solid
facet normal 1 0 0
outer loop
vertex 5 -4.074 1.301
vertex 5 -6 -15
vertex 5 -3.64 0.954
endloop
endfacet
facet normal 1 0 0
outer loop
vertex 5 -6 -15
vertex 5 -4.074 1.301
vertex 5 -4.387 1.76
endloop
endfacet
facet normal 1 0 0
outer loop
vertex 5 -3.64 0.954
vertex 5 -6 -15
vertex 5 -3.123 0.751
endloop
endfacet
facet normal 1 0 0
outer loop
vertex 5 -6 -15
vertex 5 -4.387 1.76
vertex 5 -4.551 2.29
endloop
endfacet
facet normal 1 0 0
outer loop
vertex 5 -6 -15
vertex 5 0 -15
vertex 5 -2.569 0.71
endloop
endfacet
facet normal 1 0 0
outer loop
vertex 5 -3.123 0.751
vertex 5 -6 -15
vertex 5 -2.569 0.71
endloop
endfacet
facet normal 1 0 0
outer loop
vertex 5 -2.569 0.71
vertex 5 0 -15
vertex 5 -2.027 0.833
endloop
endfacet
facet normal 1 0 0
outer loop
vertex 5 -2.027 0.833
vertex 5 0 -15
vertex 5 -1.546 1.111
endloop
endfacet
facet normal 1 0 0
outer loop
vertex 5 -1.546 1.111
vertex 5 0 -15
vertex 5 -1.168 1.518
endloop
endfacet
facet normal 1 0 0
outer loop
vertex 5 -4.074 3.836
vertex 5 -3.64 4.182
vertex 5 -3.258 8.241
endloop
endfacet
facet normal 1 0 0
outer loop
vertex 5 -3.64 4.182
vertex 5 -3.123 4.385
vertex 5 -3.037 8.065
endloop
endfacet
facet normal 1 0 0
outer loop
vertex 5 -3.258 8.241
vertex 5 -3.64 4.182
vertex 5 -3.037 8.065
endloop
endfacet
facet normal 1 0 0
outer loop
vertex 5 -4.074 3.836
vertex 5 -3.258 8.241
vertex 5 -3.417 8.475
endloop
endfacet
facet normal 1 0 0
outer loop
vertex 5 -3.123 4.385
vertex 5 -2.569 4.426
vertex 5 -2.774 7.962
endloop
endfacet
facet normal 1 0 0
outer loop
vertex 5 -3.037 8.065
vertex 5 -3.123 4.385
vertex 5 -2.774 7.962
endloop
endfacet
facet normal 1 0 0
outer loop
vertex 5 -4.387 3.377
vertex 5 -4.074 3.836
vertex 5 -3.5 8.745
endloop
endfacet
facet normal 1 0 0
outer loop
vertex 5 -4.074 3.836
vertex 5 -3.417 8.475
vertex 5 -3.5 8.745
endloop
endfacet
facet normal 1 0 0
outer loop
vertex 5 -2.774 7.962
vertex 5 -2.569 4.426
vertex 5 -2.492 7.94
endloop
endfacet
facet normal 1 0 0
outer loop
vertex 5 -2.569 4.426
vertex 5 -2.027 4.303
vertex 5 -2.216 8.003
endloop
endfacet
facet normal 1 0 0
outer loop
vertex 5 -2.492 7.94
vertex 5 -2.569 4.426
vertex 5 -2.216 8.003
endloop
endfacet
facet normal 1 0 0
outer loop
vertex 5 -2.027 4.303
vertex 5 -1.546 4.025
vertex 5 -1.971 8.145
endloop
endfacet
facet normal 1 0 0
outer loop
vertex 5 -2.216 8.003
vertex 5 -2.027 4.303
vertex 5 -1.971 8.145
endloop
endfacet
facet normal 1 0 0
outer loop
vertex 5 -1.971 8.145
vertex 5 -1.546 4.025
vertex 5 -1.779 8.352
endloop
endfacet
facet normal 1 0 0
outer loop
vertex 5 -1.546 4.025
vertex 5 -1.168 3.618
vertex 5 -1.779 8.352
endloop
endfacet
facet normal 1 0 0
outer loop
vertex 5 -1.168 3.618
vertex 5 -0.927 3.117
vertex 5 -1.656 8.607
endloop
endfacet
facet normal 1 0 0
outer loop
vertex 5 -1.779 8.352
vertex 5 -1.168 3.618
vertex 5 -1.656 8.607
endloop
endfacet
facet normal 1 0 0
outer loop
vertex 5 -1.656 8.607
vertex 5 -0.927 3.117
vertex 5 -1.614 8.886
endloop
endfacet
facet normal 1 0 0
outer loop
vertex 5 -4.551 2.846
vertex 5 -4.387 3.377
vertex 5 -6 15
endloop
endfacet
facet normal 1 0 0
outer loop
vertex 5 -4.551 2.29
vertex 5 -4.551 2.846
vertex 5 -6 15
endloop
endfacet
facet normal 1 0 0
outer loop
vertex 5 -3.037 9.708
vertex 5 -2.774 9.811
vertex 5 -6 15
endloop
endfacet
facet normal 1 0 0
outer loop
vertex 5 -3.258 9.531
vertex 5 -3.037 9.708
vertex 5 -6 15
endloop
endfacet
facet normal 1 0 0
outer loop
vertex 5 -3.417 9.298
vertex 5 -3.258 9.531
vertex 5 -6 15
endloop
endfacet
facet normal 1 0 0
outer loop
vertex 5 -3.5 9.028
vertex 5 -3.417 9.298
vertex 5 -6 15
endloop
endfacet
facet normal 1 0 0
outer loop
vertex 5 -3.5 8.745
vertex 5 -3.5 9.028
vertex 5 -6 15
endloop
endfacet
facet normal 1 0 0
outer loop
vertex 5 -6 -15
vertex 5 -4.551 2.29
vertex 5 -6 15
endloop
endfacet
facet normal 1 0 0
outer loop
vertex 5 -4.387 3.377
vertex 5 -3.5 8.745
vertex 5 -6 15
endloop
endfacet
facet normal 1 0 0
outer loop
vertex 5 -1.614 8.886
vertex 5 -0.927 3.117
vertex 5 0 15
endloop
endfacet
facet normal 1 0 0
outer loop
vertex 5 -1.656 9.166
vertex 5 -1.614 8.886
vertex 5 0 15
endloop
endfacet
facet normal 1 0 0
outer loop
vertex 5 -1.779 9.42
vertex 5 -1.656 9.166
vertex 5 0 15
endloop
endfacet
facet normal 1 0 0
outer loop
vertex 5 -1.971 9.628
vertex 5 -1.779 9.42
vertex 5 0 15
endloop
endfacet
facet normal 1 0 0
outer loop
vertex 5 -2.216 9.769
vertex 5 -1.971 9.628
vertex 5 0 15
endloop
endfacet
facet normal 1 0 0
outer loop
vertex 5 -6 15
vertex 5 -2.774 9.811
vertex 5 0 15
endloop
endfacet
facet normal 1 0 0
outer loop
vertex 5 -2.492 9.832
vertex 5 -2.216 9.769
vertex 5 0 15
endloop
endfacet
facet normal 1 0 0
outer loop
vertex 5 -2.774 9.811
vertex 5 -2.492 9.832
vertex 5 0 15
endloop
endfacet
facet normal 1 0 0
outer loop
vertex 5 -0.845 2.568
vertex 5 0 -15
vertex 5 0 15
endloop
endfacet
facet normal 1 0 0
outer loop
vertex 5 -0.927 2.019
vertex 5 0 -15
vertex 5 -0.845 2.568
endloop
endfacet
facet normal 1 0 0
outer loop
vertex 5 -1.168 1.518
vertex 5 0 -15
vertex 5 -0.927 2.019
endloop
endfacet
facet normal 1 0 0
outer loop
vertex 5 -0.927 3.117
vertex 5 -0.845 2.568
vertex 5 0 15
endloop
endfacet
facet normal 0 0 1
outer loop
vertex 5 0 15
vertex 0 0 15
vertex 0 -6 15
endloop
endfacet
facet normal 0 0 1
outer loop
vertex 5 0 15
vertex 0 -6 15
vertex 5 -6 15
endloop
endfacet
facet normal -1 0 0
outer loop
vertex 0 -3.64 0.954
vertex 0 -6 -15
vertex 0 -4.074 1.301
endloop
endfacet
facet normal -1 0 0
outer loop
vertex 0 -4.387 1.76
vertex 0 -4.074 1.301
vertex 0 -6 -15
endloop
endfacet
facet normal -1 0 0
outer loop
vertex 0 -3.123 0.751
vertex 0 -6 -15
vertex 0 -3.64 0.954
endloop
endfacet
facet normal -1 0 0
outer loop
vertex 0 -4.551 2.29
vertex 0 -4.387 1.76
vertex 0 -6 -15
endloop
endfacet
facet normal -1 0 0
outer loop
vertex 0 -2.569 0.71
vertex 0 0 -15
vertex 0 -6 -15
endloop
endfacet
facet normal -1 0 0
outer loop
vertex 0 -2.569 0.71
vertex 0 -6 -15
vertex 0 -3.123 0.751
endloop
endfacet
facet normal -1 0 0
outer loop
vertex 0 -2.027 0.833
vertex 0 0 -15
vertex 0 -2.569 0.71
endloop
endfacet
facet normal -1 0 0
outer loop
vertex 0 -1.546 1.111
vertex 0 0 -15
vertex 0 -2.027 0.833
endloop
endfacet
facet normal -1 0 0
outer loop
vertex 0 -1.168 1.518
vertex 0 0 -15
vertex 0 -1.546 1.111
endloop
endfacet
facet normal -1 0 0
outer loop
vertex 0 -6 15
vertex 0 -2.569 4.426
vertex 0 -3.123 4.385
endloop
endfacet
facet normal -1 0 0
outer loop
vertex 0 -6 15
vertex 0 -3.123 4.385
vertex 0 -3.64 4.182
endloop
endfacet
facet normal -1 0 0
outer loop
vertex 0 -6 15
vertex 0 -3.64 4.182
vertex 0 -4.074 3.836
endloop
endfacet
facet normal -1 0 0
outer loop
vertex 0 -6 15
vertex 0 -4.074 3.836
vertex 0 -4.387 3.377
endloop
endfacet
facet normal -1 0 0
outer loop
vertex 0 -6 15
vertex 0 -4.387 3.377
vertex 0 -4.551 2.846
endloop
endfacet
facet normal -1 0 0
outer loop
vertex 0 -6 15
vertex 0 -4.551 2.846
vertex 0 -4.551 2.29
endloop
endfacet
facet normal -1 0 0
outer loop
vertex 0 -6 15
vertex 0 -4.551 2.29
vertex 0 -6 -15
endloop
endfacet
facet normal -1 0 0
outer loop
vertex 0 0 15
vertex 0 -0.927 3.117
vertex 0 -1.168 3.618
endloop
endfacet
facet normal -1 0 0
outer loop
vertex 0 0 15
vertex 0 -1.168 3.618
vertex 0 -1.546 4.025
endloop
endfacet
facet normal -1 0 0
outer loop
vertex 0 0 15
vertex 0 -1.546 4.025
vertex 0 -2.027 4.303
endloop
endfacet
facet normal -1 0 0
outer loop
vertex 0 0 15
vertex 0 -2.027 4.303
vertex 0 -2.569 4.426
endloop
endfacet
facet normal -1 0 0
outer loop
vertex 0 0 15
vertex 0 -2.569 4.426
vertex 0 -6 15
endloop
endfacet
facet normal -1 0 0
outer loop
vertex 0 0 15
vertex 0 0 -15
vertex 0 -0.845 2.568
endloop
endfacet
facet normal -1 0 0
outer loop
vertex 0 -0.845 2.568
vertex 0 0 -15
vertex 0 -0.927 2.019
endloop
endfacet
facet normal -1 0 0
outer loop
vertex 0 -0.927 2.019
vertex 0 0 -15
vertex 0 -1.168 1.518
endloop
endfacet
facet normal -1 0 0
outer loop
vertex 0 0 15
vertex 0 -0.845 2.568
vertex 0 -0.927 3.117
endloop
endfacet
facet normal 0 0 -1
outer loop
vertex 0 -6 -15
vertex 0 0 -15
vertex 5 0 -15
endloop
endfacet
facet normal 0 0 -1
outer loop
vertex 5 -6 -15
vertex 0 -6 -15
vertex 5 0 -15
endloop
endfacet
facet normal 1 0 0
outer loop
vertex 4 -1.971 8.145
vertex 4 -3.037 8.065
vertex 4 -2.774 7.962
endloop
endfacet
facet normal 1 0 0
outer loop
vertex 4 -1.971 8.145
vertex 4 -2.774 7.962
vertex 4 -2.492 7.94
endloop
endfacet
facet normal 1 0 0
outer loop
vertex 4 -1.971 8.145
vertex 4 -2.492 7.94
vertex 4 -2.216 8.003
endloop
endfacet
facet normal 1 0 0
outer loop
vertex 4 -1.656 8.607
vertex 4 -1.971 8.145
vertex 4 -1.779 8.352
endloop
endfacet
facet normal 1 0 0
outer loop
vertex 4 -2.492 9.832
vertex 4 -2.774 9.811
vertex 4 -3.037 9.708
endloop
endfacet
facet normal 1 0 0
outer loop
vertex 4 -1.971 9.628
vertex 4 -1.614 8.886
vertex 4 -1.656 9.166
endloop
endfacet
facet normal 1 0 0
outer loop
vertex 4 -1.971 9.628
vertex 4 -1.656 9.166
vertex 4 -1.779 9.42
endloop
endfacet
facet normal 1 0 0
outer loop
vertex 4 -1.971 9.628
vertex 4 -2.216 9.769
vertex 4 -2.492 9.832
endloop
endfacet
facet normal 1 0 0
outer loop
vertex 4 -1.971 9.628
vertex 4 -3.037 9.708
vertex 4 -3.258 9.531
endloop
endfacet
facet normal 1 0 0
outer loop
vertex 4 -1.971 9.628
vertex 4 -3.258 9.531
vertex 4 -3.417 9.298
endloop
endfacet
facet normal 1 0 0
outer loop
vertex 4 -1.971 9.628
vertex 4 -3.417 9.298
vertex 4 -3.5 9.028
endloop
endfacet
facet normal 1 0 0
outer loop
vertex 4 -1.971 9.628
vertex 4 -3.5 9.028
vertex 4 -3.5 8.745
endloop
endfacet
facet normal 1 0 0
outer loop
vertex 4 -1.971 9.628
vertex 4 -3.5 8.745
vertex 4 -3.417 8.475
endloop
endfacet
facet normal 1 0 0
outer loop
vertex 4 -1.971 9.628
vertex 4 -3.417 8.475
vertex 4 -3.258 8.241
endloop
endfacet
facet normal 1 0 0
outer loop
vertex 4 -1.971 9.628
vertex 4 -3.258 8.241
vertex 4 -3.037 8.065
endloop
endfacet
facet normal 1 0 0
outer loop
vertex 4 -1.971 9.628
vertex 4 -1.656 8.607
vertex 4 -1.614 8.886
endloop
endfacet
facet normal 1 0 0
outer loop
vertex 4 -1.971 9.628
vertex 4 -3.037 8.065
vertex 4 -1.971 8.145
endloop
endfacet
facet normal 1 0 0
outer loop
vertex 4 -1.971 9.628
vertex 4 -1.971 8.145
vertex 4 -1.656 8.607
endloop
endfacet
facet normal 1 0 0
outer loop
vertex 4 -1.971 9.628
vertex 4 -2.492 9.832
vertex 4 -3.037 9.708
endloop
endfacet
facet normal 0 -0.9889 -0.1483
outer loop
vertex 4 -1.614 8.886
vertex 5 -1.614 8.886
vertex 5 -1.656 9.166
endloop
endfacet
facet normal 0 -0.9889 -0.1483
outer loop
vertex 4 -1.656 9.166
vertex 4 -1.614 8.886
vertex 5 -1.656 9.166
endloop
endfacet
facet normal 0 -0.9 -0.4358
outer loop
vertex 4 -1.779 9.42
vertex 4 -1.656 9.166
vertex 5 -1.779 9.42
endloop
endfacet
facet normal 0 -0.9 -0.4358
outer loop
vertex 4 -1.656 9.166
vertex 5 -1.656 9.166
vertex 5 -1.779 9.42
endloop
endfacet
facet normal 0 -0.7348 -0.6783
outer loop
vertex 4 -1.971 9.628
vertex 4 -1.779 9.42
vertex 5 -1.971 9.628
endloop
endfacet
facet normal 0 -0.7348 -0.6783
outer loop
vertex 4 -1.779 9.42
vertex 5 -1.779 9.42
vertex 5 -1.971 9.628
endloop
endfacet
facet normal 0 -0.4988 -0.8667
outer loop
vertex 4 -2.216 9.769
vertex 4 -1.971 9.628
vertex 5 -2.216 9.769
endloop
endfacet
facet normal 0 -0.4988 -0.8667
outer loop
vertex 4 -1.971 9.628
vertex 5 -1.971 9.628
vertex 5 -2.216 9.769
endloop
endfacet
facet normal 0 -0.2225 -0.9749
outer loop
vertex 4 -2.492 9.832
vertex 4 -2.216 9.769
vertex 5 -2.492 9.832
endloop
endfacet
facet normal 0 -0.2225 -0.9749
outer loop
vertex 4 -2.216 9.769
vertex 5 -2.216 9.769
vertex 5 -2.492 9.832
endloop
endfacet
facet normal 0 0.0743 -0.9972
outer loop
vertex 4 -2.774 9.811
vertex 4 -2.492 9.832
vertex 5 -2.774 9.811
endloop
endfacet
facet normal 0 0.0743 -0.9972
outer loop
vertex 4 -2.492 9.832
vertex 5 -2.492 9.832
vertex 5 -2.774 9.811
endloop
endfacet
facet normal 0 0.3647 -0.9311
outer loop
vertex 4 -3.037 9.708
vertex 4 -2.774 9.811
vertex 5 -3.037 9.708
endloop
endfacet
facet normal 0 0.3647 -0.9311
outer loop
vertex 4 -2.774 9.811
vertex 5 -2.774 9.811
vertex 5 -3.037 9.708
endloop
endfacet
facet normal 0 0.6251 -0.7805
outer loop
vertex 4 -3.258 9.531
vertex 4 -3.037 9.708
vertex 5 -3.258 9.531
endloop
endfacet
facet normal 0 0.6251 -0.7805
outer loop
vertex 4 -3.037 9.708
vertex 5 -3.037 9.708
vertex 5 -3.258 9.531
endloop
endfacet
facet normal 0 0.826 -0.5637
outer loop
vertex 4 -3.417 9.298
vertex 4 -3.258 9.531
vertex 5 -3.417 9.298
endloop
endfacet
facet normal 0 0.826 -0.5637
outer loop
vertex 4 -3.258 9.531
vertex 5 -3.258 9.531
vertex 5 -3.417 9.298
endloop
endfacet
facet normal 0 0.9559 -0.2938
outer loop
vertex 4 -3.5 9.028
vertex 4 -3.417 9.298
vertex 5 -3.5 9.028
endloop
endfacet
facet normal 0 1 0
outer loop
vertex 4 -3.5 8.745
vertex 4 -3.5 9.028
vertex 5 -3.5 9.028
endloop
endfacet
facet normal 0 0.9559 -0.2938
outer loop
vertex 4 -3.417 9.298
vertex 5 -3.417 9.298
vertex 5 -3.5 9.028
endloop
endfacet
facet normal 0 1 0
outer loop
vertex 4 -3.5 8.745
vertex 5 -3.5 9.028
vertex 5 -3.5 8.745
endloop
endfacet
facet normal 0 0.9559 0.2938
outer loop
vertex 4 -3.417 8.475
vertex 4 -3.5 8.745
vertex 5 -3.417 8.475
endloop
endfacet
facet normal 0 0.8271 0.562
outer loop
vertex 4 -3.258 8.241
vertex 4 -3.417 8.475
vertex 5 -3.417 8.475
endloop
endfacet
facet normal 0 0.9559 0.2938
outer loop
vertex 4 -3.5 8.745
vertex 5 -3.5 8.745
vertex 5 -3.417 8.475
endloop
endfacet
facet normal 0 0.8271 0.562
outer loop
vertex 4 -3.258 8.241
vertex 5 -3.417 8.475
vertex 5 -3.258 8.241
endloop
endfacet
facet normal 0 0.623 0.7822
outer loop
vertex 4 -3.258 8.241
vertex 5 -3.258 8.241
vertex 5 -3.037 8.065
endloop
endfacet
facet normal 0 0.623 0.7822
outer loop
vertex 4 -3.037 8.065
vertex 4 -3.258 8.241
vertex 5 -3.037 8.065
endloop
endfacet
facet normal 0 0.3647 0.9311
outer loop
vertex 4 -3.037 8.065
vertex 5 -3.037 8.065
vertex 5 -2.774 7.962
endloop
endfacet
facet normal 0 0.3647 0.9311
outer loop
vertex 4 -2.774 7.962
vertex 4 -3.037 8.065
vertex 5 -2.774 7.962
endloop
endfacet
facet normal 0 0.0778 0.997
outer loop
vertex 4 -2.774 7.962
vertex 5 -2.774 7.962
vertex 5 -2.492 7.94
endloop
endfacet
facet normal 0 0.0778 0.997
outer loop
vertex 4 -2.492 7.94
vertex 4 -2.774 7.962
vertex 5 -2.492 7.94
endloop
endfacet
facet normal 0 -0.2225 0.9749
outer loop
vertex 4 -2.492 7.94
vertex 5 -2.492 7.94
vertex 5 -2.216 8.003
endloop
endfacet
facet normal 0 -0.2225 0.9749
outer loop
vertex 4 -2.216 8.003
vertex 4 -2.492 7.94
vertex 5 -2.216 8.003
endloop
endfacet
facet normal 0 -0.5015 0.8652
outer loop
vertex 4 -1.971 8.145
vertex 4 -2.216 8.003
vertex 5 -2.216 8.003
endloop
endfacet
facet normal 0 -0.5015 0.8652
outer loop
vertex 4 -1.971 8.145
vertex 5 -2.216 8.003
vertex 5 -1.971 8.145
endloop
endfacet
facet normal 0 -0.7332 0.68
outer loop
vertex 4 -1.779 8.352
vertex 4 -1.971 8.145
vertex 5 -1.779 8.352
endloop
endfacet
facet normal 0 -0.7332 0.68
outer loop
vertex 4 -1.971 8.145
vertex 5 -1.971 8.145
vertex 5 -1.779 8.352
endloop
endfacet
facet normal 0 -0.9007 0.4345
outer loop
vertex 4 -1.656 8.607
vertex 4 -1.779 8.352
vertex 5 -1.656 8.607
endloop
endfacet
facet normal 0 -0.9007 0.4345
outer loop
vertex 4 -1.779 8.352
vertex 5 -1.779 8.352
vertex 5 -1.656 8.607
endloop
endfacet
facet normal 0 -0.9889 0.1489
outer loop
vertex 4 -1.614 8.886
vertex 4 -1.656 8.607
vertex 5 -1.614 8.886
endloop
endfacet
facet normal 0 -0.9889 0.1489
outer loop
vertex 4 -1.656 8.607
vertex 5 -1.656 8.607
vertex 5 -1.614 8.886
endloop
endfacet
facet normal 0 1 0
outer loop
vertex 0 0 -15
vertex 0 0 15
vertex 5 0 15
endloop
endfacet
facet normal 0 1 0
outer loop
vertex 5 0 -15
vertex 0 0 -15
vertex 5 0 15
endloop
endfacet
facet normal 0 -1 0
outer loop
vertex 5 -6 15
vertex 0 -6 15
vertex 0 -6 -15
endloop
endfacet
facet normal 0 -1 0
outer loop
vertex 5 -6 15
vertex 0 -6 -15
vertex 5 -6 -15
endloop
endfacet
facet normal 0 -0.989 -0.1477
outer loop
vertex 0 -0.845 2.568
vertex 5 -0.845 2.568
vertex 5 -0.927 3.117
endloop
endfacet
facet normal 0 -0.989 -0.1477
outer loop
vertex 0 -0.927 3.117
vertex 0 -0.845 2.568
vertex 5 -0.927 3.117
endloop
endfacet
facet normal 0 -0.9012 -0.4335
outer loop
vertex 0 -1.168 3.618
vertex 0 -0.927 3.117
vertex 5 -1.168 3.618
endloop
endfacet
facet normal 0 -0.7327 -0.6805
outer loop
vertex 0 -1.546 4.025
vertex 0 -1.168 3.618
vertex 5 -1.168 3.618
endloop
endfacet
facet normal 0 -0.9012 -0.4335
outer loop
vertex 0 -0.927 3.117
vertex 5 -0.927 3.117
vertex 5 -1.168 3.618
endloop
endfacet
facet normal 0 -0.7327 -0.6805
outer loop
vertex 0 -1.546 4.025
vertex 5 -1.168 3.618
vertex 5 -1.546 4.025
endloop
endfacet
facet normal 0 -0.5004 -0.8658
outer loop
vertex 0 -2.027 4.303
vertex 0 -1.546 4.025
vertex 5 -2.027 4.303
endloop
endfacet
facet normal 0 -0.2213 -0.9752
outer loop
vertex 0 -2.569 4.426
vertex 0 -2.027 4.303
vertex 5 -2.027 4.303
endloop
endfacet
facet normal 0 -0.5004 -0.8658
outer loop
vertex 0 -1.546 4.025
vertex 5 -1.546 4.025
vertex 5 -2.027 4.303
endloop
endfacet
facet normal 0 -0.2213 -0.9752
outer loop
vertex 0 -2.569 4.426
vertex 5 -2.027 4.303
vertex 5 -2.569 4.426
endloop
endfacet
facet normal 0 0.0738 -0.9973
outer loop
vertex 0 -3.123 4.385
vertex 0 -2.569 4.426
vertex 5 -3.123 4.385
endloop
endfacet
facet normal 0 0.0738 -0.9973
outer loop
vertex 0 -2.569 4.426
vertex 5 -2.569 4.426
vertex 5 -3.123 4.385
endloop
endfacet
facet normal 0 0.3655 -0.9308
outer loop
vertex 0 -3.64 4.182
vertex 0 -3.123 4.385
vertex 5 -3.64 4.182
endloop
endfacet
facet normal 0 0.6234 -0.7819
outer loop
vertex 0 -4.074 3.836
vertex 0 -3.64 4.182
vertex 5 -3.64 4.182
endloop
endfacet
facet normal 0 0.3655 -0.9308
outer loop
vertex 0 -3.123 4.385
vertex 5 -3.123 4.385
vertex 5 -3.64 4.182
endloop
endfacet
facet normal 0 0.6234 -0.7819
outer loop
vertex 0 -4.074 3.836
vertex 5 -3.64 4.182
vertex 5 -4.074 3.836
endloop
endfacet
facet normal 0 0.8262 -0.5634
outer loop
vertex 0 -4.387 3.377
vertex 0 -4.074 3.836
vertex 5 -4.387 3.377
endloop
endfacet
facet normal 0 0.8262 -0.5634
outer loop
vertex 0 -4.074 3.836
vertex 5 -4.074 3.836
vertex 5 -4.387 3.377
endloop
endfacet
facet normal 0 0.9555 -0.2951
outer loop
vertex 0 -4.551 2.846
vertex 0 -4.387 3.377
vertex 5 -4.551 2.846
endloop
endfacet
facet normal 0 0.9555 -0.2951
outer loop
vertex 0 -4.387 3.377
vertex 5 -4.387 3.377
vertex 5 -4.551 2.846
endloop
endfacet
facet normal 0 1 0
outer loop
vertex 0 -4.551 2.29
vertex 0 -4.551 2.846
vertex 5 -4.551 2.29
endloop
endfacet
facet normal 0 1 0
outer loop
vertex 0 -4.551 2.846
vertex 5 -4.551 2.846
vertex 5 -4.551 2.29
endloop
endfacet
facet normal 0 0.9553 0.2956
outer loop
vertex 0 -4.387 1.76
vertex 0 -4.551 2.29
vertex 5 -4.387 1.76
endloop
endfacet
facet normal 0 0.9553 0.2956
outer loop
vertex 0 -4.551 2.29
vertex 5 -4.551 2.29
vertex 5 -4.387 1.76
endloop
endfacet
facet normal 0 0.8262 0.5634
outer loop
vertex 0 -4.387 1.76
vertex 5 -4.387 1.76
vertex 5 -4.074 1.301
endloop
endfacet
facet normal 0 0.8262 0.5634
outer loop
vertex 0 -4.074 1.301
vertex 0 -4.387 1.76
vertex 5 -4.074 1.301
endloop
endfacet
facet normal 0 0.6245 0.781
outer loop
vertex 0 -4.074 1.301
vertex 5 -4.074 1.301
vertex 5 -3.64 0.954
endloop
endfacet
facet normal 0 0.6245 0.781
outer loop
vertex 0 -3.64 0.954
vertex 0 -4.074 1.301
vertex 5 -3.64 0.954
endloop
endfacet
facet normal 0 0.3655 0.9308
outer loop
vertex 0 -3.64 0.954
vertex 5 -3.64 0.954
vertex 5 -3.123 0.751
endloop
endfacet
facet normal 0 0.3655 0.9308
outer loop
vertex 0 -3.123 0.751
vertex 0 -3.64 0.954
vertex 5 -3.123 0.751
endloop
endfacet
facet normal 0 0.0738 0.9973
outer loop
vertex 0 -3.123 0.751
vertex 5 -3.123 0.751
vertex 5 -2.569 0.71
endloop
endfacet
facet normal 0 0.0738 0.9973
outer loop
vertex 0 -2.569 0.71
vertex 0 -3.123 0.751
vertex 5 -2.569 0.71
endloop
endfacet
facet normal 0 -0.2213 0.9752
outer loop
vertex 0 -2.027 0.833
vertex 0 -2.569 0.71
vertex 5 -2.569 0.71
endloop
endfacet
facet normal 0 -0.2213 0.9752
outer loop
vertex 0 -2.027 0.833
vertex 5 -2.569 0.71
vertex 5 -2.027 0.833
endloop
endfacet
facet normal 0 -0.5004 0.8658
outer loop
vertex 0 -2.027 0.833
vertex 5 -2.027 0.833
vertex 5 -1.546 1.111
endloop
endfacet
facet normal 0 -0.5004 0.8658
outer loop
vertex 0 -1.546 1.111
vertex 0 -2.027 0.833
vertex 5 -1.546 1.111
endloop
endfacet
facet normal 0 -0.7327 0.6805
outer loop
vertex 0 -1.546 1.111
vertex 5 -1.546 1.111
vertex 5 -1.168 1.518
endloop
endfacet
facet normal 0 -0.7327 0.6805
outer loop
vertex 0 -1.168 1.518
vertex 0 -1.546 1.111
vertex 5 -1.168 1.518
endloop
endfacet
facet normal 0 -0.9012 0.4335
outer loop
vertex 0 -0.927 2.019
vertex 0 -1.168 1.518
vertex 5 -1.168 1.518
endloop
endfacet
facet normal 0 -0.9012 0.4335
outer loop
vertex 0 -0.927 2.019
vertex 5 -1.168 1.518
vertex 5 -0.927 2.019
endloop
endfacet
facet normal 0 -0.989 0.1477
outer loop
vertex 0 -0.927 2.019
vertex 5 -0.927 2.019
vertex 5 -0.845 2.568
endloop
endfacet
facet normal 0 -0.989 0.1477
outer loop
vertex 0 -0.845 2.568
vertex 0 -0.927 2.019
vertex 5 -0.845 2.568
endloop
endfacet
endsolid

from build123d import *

# Parameters (mm, degrees)
F0_W     = 5
F0_H     = 30
F1_DEPTH = 6
F2_R     = 0.948442
F3_DEPTH = 1
F4_R     = 1.863501
F5_DEPTH = 5.001


with BuildPart() as f1:
    # F0 (on Front) → F1 (new body)
    with BuildSketch(Plane.XZ):
        with Locations((2.5, 0)):
            Rectangle(F0_W, F0_H)
    extrude(amount=F1_DEPTH)

    # F2 (on face) → F3 (cut)
    with BuildSketch(Plane.YZ.offset(5)):
        with Locations((-2.562478, 8.886208)):
            Circle(F2_R)
    extrude(amount=-F3_DEPTH, mode=Mode.SUBTRACT)

    # F4 (on face) → F5 (cut, through all)
    with BuildSketch(Plane.YZ.offset(5)):
        with Locations((-2.708179, 2.568147)):
            Circle(F4_R)
    extrude(amount=-F5_DEPTH, mode=Mode.SUBTRACT)


solid = f1.part
